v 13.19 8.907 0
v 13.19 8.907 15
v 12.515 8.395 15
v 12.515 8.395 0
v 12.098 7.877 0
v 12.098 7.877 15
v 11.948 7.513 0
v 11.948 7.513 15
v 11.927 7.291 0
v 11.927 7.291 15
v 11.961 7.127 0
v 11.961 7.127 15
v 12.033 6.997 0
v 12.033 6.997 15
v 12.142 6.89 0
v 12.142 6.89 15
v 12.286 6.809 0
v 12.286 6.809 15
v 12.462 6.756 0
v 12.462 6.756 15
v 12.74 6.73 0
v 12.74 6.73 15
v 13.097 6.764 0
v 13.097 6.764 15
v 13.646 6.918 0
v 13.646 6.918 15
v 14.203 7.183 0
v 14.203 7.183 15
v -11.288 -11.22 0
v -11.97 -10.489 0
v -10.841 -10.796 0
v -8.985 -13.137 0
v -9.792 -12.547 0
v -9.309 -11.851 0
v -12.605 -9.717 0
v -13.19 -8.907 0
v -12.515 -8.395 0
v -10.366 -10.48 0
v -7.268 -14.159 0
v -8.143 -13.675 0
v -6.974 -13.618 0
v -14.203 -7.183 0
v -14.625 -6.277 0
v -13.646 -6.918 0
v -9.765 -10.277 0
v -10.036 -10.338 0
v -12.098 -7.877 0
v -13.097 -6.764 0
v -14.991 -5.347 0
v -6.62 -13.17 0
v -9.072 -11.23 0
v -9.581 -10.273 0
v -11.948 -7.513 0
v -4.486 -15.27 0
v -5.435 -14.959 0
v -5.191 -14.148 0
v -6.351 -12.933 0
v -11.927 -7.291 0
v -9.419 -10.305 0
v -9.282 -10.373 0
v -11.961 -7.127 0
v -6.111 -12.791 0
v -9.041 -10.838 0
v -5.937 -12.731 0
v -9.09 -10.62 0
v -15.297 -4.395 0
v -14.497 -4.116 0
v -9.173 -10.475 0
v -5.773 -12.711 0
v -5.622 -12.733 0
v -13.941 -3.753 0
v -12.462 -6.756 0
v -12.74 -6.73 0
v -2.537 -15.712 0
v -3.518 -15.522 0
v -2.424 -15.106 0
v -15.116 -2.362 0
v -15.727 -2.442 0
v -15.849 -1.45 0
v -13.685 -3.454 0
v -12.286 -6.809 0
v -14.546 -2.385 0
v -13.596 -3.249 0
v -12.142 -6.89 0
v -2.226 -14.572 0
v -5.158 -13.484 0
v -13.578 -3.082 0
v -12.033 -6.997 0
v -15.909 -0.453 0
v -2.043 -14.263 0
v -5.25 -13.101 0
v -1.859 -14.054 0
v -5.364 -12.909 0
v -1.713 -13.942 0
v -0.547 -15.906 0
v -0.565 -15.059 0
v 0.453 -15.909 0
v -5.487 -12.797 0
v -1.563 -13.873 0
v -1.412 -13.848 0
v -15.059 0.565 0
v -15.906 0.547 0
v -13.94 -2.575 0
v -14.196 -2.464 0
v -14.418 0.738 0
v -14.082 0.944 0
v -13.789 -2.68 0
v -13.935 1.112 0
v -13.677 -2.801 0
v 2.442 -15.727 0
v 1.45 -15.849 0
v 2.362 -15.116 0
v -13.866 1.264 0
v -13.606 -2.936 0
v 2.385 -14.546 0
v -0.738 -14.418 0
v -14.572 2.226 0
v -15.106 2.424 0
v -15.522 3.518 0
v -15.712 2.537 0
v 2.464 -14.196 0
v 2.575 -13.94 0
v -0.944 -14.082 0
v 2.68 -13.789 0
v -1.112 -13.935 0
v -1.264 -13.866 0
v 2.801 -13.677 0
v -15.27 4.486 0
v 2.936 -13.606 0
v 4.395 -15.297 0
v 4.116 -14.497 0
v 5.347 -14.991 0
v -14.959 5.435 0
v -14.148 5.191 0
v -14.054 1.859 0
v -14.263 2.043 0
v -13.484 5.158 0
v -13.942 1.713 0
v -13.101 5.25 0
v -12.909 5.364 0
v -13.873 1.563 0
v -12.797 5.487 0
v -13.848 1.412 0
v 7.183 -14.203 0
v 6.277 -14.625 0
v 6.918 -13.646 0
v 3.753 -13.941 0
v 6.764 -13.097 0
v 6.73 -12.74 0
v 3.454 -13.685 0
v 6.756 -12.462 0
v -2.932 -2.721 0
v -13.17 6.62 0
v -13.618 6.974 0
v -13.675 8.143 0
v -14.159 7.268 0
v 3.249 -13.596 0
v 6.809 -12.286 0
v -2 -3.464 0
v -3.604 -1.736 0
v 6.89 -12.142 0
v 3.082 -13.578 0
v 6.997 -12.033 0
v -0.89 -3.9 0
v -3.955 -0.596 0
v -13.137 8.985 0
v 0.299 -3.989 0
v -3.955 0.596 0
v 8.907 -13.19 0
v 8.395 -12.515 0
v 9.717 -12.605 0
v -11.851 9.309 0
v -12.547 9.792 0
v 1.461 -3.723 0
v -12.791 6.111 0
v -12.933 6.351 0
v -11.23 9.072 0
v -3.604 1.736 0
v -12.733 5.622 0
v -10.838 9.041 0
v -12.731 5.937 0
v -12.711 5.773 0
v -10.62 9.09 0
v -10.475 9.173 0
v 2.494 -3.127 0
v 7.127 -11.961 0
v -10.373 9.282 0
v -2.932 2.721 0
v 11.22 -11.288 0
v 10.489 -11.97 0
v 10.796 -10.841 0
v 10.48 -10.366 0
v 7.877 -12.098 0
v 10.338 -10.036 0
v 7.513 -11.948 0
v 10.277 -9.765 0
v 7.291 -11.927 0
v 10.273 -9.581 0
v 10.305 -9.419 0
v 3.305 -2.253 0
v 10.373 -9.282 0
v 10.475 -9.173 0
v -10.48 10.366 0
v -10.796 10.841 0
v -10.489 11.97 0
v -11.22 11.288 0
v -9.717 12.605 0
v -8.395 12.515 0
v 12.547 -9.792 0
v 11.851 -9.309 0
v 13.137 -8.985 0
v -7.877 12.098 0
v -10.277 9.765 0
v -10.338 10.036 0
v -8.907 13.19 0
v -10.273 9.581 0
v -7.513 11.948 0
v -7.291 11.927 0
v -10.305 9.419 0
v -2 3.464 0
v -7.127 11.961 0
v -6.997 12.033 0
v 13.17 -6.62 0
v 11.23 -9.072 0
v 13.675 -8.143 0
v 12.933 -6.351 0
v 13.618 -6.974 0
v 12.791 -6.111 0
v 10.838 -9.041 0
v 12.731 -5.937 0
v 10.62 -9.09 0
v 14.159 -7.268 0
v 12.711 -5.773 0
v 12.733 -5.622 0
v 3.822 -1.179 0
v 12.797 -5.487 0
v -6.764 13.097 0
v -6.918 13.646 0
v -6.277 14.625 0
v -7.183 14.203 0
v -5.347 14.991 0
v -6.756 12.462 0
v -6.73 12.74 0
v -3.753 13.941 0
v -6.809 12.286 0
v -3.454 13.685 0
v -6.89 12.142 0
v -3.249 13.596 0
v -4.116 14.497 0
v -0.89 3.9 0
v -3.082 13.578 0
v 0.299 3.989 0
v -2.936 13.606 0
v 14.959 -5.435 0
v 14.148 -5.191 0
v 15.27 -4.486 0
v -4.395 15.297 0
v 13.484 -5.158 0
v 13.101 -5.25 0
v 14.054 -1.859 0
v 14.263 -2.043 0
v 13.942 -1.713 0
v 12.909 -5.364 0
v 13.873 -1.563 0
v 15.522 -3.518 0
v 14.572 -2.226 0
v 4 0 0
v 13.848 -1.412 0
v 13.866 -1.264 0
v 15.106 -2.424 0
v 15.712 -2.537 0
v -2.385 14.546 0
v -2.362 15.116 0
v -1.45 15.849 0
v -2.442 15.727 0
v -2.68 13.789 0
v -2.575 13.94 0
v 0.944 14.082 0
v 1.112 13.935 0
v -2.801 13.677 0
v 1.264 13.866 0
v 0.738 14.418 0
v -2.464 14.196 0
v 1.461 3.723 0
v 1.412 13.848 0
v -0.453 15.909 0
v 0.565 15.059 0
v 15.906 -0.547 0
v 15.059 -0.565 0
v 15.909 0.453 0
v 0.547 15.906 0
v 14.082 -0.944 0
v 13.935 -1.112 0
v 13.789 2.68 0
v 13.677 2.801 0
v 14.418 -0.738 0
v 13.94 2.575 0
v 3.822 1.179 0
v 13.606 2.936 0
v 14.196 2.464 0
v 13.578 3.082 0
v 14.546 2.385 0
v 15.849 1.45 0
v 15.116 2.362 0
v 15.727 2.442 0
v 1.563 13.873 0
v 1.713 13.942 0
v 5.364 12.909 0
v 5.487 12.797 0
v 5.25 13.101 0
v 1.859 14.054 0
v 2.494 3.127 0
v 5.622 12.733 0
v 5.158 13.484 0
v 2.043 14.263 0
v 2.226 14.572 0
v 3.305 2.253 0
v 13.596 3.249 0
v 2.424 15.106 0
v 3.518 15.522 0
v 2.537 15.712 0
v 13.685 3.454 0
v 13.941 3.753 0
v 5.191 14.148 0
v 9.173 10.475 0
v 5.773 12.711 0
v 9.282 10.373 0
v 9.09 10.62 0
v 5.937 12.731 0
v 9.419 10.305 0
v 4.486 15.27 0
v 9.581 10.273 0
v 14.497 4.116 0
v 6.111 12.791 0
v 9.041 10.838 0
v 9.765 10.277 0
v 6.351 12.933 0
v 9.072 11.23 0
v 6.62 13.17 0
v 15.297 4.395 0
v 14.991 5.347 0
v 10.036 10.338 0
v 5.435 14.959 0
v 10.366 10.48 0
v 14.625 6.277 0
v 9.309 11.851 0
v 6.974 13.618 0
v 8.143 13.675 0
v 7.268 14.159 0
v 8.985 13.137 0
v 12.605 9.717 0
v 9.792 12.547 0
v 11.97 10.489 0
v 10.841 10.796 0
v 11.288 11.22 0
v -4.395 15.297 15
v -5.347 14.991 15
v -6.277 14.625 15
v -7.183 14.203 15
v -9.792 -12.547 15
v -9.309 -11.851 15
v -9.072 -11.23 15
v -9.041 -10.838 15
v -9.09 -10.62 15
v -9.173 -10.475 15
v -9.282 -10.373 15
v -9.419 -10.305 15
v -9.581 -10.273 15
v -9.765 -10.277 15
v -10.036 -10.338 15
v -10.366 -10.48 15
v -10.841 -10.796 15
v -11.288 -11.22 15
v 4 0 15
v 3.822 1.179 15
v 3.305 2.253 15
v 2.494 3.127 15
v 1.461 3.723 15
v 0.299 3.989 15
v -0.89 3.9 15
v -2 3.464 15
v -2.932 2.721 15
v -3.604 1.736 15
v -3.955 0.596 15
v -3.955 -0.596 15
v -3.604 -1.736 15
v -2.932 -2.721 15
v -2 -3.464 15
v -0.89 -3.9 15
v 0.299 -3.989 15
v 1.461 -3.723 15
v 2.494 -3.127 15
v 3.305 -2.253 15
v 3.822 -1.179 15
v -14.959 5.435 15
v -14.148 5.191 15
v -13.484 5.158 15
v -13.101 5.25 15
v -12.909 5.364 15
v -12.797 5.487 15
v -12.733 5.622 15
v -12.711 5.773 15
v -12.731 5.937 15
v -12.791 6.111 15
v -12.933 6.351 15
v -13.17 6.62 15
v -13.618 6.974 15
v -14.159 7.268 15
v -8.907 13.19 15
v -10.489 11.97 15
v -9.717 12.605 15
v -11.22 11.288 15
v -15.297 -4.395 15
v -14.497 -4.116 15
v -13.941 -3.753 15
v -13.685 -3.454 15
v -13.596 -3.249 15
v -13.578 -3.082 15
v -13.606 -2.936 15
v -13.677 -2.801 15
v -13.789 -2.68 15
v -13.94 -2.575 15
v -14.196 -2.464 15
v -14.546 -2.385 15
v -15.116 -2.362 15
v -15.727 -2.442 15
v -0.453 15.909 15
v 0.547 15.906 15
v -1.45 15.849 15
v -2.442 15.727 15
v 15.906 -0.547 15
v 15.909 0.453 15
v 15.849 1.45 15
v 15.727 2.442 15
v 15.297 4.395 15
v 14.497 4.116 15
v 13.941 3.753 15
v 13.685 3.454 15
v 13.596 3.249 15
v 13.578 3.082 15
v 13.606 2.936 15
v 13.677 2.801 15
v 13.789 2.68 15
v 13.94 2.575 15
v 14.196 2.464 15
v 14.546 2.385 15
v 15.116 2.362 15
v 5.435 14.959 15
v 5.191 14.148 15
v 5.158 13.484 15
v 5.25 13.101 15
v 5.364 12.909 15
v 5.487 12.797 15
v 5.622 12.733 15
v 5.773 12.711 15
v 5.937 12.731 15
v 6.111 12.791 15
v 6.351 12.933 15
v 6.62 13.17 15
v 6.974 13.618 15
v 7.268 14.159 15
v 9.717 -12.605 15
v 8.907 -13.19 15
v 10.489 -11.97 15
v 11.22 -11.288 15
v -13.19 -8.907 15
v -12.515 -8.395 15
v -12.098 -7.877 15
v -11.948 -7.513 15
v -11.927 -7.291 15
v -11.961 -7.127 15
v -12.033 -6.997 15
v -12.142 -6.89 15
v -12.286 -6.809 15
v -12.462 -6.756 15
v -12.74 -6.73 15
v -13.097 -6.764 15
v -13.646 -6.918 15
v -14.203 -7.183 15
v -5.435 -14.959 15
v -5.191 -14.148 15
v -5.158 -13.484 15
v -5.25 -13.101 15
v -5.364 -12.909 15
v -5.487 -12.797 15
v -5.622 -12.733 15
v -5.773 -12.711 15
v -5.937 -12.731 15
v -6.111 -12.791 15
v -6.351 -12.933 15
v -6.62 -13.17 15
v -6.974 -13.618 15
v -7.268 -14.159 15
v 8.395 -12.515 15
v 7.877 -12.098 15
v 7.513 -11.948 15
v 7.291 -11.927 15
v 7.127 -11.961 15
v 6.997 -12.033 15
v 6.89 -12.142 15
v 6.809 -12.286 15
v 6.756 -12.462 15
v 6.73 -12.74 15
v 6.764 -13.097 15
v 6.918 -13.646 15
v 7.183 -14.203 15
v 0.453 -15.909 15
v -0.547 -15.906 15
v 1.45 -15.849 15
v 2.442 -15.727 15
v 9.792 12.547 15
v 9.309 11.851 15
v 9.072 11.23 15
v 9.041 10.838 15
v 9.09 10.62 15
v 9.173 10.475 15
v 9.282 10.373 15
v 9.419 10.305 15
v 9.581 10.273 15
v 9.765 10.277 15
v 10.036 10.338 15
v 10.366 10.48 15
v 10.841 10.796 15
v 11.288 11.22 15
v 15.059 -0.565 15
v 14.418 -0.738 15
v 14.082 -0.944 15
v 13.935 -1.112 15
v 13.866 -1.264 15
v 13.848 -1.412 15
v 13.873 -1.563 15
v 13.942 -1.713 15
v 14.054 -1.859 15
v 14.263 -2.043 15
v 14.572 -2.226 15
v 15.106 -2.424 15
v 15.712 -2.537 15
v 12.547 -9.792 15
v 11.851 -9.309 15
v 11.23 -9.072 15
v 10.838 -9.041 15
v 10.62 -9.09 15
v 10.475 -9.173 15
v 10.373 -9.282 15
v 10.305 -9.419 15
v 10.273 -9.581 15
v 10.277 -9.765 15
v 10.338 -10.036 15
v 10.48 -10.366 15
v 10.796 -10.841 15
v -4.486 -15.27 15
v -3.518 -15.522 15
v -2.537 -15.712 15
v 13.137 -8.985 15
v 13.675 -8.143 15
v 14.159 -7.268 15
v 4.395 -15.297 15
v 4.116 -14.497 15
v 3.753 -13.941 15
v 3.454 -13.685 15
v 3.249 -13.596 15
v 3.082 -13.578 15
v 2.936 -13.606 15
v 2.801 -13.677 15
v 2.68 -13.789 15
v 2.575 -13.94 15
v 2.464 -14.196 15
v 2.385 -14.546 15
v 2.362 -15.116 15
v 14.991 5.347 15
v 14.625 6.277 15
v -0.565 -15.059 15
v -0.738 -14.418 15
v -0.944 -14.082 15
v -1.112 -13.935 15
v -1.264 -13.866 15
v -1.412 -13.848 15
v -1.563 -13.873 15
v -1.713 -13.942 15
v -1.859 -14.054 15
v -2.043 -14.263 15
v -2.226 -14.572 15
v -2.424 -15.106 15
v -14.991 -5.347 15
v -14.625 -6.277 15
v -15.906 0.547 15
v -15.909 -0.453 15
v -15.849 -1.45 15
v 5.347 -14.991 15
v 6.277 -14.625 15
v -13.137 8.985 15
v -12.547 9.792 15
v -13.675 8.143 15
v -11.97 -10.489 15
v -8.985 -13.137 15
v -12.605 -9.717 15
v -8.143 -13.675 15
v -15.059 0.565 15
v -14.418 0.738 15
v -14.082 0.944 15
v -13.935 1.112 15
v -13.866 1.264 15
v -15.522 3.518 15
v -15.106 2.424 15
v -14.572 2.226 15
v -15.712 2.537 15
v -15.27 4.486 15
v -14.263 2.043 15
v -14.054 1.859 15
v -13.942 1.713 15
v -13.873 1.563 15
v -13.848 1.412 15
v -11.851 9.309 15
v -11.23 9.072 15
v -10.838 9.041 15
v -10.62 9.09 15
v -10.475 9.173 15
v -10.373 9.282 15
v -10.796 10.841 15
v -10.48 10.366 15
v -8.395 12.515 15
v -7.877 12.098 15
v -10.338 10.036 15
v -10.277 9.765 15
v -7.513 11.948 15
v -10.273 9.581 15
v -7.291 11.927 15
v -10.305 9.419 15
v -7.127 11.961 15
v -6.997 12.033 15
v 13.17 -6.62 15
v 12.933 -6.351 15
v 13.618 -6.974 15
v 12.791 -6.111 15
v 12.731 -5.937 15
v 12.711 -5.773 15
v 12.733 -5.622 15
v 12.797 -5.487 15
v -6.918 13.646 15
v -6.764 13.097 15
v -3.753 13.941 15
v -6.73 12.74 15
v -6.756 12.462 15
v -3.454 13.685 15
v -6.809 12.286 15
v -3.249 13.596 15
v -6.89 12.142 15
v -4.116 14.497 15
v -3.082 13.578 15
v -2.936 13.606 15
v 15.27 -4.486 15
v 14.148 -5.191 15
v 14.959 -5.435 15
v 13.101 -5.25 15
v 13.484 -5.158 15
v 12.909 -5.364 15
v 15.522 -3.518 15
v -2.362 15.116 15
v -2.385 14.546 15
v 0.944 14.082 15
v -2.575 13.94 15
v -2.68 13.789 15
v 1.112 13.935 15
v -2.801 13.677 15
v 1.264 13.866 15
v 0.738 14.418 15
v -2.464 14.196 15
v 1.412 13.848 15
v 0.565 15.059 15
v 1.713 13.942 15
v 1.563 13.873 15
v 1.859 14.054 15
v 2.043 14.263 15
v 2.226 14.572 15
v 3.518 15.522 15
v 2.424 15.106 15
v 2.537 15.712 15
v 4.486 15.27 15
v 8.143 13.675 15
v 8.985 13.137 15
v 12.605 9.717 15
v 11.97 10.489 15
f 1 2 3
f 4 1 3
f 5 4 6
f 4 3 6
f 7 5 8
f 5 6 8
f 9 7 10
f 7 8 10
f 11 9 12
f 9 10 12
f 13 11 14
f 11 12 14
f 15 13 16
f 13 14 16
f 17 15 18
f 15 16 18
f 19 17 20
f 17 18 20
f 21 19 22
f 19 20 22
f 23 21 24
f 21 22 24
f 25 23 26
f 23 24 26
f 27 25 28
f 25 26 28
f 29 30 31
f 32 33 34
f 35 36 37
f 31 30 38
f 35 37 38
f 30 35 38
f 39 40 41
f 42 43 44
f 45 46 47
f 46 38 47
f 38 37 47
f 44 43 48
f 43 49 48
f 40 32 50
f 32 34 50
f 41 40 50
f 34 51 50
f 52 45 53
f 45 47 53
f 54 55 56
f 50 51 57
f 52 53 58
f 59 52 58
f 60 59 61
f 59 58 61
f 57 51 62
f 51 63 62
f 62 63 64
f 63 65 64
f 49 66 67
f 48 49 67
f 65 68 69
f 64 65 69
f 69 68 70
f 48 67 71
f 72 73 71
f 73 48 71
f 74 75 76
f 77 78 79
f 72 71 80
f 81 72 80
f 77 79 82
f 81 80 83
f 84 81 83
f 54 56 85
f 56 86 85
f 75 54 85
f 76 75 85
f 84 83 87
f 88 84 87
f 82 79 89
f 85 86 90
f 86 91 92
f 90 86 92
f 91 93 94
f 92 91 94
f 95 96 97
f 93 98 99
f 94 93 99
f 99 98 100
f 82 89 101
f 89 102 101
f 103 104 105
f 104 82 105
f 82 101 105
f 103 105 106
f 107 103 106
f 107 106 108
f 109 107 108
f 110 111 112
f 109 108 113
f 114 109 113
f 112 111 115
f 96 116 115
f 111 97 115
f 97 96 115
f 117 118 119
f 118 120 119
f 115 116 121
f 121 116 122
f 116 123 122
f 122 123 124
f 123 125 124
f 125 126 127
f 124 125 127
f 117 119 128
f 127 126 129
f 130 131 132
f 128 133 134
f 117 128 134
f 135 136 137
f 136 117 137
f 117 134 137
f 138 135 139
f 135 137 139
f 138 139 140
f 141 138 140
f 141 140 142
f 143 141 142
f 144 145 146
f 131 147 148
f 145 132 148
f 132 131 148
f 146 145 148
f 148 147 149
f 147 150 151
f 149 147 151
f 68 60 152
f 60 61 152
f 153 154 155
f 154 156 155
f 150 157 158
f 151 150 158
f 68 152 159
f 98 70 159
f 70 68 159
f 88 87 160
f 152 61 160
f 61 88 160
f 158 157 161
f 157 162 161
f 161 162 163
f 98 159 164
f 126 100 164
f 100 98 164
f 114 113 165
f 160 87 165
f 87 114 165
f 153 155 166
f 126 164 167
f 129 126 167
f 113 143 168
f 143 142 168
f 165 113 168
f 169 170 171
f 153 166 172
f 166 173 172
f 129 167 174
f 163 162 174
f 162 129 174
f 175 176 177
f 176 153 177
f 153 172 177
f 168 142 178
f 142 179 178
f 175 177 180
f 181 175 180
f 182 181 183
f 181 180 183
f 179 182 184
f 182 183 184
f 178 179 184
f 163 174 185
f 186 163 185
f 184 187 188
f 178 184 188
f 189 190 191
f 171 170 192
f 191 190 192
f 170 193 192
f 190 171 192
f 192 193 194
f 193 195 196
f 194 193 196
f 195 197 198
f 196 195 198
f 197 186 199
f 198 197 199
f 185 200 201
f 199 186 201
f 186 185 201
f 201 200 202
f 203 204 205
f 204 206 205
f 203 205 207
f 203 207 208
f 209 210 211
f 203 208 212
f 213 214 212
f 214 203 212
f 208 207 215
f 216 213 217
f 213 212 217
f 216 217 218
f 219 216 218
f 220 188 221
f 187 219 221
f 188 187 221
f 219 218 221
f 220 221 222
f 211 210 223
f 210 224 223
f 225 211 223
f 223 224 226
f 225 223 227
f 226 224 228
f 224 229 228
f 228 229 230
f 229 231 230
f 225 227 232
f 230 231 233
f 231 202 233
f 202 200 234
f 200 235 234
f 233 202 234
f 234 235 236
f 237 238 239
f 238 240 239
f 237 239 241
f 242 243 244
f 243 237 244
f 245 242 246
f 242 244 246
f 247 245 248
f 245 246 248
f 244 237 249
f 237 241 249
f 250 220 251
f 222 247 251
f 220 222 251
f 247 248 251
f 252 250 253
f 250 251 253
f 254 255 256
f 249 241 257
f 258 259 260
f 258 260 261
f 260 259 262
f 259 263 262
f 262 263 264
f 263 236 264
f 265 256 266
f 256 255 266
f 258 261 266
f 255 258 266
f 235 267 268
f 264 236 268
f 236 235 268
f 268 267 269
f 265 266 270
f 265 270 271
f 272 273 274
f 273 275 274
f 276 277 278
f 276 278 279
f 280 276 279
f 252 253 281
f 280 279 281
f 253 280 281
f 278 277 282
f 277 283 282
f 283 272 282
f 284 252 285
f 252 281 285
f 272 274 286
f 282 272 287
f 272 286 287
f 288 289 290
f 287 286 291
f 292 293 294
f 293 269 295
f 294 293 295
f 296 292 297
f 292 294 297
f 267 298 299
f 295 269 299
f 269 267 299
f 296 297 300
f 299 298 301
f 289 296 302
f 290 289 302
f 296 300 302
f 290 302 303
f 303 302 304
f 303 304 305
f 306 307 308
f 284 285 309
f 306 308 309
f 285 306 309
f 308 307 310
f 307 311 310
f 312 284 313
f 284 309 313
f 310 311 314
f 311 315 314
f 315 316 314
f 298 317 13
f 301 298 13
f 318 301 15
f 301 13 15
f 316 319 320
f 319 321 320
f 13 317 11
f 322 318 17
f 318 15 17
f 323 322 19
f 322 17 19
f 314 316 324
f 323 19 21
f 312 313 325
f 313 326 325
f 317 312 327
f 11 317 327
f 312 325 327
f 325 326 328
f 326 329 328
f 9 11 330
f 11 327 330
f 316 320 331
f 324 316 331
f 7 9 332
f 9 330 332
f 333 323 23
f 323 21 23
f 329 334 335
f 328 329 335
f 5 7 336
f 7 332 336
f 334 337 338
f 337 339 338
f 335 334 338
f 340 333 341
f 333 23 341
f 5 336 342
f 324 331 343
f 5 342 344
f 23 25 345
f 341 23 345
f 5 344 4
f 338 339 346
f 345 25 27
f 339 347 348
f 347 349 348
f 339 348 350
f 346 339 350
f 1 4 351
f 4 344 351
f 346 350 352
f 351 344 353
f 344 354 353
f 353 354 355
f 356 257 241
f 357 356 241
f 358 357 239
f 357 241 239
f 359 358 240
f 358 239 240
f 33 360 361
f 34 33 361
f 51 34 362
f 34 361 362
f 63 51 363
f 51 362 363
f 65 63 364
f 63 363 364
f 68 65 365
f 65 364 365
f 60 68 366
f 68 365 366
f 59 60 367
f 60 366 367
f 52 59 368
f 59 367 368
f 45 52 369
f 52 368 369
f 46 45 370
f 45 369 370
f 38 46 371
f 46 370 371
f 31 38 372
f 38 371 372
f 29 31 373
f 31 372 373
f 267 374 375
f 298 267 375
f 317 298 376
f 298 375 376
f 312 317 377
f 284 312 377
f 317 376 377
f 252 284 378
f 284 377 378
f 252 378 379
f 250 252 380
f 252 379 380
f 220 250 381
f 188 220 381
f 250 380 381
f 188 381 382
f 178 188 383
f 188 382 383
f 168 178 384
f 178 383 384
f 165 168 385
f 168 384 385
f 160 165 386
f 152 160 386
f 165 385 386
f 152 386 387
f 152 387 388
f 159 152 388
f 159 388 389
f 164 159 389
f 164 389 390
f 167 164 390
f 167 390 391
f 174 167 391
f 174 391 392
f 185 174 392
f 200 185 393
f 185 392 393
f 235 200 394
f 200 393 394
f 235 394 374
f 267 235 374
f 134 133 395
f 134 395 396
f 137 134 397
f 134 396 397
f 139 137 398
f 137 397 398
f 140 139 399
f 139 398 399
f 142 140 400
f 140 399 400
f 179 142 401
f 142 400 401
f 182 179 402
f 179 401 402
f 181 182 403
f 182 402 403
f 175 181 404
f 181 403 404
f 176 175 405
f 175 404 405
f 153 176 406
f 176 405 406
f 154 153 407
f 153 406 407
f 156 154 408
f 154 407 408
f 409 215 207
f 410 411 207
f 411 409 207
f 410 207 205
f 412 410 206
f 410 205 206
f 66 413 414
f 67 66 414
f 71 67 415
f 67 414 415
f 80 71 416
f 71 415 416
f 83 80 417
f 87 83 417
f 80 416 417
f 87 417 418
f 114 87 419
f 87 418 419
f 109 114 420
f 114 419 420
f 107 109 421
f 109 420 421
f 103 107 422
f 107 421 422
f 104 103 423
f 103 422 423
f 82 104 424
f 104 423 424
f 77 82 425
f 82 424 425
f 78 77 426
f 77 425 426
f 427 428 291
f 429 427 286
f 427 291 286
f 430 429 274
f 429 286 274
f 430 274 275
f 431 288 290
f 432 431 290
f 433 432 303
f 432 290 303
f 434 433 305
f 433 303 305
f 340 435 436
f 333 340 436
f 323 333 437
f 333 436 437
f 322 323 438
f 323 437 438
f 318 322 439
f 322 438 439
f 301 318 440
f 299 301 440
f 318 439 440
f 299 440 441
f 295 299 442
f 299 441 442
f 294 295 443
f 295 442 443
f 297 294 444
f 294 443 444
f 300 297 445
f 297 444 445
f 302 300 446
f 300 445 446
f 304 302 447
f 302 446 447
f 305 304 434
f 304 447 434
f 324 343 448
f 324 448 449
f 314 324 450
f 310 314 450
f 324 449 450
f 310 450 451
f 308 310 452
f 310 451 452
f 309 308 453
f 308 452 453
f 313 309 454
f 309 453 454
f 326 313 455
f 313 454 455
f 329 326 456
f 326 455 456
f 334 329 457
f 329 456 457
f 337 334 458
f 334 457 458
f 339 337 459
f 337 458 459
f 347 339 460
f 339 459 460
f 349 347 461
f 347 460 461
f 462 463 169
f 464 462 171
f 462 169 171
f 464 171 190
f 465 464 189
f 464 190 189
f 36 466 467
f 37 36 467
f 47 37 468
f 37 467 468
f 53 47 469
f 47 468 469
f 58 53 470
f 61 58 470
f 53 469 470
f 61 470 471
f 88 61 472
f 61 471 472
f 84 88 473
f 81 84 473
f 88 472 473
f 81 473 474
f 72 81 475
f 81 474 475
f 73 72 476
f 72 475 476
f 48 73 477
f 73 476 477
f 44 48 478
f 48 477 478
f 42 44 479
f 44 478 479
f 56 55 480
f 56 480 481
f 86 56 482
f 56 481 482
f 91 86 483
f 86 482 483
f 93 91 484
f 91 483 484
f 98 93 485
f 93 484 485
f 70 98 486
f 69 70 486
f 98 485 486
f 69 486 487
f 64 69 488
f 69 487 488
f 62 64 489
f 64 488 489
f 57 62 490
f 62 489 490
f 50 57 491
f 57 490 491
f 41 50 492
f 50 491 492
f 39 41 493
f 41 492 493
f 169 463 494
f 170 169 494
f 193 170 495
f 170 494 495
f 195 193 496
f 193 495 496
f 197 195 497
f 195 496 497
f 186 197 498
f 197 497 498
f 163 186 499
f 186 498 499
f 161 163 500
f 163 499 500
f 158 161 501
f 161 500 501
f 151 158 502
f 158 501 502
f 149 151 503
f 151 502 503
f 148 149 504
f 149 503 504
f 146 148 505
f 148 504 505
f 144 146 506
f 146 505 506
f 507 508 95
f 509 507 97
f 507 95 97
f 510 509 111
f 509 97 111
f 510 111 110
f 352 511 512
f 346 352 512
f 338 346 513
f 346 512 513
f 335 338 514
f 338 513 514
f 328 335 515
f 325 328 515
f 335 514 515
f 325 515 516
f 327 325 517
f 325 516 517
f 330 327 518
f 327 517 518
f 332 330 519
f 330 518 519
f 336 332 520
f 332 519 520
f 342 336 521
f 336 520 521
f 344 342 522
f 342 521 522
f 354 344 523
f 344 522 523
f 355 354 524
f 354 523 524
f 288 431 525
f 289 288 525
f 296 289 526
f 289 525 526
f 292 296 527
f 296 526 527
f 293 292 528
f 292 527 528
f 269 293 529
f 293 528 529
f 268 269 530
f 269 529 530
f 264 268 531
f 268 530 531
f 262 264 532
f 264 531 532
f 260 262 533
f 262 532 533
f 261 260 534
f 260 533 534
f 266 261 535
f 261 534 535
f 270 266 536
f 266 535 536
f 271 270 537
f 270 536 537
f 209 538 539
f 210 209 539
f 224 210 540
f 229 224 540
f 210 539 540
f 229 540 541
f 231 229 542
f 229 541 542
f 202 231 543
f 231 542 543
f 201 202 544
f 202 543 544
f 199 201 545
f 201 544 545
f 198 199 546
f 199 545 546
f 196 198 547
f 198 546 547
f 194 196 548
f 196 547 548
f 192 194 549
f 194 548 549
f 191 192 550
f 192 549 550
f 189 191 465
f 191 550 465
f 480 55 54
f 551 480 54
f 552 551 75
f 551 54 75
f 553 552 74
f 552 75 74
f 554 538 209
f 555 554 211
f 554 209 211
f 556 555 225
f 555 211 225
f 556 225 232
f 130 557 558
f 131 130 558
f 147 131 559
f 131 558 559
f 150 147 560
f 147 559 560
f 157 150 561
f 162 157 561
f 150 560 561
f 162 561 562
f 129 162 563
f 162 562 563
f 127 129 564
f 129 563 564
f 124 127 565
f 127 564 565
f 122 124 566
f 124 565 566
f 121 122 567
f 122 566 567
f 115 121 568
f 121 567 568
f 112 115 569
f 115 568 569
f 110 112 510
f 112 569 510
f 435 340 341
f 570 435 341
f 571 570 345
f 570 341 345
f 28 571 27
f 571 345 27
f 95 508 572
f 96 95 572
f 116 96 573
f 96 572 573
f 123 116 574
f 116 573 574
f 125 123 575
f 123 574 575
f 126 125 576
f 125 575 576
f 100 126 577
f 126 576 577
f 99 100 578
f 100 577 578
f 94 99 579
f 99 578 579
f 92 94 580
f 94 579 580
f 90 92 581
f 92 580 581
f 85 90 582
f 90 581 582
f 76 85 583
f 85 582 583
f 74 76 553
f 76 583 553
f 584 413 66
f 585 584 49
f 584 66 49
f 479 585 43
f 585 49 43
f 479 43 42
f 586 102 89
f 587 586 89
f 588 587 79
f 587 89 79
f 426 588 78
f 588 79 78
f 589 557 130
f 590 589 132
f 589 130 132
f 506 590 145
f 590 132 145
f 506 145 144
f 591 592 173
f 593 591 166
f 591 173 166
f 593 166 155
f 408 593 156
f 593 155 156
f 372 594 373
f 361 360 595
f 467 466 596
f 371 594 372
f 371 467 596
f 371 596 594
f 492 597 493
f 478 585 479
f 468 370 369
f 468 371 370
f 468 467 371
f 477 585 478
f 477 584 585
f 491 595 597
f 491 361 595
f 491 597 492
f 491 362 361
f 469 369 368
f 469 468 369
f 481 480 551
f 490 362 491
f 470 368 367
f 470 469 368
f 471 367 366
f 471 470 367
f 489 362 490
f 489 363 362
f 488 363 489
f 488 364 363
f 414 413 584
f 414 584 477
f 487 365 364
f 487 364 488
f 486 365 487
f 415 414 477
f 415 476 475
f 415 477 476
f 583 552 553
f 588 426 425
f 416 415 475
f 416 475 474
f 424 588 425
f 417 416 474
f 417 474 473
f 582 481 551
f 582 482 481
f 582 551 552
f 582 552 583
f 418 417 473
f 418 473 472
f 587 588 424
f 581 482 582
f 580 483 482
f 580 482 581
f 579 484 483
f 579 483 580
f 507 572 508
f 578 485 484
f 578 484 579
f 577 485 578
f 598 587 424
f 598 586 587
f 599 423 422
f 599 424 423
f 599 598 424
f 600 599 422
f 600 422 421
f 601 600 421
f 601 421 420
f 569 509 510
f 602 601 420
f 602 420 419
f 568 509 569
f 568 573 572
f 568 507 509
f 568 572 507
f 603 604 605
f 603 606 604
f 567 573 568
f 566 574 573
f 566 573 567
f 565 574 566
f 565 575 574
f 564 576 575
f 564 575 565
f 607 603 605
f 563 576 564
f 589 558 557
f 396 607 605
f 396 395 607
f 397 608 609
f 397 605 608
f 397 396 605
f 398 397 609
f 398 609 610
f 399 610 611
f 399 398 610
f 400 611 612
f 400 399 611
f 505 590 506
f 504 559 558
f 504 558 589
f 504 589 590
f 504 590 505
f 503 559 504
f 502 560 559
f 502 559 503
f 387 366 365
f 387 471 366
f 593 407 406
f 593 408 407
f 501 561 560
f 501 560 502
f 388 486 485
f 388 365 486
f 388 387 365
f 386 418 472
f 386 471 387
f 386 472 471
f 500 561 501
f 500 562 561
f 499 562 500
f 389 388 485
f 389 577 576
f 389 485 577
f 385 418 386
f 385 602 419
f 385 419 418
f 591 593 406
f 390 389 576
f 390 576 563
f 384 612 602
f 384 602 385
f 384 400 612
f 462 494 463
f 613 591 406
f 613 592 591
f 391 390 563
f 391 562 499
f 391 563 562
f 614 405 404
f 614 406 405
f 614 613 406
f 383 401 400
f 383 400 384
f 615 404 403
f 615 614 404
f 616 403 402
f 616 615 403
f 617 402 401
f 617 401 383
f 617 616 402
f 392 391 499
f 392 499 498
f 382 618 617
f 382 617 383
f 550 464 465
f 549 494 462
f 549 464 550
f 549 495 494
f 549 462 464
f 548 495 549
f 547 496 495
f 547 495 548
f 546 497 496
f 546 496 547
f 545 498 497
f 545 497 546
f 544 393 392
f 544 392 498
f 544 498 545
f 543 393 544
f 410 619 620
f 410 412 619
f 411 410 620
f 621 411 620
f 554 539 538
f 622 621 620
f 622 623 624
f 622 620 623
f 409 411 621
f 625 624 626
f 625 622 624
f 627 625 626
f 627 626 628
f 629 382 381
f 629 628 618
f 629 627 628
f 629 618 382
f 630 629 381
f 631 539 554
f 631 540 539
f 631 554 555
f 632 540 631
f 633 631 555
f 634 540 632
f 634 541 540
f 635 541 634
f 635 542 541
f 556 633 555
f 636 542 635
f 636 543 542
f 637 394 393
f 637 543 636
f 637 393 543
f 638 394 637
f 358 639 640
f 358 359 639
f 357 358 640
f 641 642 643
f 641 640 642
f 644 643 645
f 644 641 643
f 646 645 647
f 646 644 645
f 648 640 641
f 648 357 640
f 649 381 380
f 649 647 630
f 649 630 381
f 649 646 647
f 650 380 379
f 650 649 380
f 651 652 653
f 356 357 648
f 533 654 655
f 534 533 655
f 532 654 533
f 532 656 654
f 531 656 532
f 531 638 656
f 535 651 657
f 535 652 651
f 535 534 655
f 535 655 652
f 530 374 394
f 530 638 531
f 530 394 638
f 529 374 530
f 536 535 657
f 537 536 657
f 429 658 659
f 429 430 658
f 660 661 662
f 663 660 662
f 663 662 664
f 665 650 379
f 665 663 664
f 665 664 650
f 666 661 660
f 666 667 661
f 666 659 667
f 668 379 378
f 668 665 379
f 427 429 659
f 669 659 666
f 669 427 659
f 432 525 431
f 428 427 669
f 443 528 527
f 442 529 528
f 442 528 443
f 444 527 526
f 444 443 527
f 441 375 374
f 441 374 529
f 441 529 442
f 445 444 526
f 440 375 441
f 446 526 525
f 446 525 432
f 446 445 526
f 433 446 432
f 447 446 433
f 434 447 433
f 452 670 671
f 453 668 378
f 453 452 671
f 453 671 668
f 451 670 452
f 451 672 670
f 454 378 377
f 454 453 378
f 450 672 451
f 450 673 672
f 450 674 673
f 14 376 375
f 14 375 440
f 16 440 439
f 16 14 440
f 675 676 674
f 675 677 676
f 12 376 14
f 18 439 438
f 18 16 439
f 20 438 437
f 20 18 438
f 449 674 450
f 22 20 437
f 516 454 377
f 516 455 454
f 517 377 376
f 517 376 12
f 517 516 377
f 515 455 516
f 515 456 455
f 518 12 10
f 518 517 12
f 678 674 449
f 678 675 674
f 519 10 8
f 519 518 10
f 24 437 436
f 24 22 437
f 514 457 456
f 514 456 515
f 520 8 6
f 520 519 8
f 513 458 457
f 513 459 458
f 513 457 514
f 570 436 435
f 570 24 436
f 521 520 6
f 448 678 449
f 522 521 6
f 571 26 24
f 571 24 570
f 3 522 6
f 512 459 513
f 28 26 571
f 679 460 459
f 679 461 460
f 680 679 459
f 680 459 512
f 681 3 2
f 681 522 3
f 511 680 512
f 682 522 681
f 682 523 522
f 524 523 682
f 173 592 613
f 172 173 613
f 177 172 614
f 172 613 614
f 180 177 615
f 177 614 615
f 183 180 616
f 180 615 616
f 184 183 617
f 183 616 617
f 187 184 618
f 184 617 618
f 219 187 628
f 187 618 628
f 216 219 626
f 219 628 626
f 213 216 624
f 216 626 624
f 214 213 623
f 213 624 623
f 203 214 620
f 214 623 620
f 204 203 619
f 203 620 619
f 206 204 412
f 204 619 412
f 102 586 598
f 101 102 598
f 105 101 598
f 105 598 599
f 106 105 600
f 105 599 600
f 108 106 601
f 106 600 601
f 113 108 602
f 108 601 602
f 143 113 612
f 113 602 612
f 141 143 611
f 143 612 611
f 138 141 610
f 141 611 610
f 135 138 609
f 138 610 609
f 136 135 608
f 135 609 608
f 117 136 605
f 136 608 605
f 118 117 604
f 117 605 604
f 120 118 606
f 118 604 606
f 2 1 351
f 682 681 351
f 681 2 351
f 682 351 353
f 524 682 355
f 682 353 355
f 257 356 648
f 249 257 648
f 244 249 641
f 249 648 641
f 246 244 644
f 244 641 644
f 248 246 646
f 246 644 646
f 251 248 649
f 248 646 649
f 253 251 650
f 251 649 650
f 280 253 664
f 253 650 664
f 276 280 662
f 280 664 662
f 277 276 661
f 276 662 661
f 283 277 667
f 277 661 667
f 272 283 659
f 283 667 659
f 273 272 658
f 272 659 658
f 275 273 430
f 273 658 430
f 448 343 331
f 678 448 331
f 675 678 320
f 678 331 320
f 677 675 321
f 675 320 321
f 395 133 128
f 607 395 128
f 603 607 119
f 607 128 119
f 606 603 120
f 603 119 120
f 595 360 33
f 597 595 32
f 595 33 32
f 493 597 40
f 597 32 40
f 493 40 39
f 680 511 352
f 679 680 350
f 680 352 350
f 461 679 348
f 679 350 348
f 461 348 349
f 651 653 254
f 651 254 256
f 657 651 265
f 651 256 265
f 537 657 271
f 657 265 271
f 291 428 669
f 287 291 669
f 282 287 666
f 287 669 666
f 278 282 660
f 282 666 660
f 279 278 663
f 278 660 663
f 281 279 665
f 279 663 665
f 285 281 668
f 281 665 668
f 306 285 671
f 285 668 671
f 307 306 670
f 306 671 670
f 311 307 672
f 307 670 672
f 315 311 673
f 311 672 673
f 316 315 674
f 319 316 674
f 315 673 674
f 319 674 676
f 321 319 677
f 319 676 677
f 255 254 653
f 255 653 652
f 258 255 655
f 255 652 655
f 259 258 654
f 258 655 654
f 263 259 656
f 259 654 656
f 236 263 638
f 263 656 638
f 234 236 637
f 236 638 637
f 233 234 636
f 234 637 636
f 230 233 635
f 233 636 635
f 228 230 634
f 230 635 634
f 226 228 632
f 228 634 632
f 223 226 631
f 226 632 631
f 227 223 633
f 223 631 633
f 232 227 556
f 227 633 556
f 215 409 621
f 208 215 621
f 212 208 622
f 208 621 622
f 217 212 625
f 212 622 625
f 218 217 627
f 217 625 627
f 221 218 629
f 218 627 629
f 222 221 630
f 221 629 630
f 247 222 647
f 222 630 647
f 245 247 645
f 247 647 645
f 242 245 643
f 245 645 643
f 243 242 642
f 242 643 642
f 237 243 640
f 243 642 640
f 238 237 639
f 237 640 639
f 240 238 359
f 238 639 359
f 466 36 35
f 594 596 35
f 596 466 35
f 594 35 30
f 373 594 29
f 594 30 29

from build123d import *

# Parameters (mm, degrees)
SKETCH_1_R               = 15.91549431
EXTRUDE_2_DEPTH          = 15
SKETCH_2_R               = 4
CUT_EXTRUDE_1_DEPTH      = 15
SKETCH_3_RX              = 2
SKETCH_3_RY              = 1
CUT_EXTRUDE_2_DEPTH      = 15
PATTERN_CIRCULAR_1_COUNT = 20


with BuildPart() as part:
    # Эскиз1 → Бобышка-Вытянуть2 (new body)
    with BuildSketch(Plane.XY):
        Circle(SKETCH_1_R)
    extrude(amount=EXTRUDE_2_DEPTH)

    # Эскиз2 → Вырез-Вытянуть1 (cut)
    with BuildSketch(Plane.XY.offset(15)):
        Circle(SKETCH_2_R)
    extrude(amount=-CUT_EXTRUDE_1_DEPTH, mode=Mode.SUBTRACT)

    # Эскиз3 → Вырез-Вытянуть2 (cut)
    with BuildSketch(Plane.XY.offset(15)):
        with Locations(Location((13.72327338, 8.060690222), (0, 0, 30.428856936))):
            Ellipse(SKETCH_3_RX, SKETCH_3_RY)
    cut_extrude_2 = extrude(amount=-CUT_EXTRUDE_2_DEPTH, mode=Mode.SUBTRACT)

    # Круговой массив1: Вырез-Вытянуть2 ×20 about axis
    pattern_circular_1_axis = Axis((0, 0, 15), (0, 0, 1))
    for i in range(1, PATTERN_CIRCULAR_1_COUNT):
        add(cut_extrude_2.rotate(pattern_circular_1_axis, i * 360 / PATTERN_CIRCULAR_1_COUNT), mode=Mode.SUBTRACT)


solid = part.part
